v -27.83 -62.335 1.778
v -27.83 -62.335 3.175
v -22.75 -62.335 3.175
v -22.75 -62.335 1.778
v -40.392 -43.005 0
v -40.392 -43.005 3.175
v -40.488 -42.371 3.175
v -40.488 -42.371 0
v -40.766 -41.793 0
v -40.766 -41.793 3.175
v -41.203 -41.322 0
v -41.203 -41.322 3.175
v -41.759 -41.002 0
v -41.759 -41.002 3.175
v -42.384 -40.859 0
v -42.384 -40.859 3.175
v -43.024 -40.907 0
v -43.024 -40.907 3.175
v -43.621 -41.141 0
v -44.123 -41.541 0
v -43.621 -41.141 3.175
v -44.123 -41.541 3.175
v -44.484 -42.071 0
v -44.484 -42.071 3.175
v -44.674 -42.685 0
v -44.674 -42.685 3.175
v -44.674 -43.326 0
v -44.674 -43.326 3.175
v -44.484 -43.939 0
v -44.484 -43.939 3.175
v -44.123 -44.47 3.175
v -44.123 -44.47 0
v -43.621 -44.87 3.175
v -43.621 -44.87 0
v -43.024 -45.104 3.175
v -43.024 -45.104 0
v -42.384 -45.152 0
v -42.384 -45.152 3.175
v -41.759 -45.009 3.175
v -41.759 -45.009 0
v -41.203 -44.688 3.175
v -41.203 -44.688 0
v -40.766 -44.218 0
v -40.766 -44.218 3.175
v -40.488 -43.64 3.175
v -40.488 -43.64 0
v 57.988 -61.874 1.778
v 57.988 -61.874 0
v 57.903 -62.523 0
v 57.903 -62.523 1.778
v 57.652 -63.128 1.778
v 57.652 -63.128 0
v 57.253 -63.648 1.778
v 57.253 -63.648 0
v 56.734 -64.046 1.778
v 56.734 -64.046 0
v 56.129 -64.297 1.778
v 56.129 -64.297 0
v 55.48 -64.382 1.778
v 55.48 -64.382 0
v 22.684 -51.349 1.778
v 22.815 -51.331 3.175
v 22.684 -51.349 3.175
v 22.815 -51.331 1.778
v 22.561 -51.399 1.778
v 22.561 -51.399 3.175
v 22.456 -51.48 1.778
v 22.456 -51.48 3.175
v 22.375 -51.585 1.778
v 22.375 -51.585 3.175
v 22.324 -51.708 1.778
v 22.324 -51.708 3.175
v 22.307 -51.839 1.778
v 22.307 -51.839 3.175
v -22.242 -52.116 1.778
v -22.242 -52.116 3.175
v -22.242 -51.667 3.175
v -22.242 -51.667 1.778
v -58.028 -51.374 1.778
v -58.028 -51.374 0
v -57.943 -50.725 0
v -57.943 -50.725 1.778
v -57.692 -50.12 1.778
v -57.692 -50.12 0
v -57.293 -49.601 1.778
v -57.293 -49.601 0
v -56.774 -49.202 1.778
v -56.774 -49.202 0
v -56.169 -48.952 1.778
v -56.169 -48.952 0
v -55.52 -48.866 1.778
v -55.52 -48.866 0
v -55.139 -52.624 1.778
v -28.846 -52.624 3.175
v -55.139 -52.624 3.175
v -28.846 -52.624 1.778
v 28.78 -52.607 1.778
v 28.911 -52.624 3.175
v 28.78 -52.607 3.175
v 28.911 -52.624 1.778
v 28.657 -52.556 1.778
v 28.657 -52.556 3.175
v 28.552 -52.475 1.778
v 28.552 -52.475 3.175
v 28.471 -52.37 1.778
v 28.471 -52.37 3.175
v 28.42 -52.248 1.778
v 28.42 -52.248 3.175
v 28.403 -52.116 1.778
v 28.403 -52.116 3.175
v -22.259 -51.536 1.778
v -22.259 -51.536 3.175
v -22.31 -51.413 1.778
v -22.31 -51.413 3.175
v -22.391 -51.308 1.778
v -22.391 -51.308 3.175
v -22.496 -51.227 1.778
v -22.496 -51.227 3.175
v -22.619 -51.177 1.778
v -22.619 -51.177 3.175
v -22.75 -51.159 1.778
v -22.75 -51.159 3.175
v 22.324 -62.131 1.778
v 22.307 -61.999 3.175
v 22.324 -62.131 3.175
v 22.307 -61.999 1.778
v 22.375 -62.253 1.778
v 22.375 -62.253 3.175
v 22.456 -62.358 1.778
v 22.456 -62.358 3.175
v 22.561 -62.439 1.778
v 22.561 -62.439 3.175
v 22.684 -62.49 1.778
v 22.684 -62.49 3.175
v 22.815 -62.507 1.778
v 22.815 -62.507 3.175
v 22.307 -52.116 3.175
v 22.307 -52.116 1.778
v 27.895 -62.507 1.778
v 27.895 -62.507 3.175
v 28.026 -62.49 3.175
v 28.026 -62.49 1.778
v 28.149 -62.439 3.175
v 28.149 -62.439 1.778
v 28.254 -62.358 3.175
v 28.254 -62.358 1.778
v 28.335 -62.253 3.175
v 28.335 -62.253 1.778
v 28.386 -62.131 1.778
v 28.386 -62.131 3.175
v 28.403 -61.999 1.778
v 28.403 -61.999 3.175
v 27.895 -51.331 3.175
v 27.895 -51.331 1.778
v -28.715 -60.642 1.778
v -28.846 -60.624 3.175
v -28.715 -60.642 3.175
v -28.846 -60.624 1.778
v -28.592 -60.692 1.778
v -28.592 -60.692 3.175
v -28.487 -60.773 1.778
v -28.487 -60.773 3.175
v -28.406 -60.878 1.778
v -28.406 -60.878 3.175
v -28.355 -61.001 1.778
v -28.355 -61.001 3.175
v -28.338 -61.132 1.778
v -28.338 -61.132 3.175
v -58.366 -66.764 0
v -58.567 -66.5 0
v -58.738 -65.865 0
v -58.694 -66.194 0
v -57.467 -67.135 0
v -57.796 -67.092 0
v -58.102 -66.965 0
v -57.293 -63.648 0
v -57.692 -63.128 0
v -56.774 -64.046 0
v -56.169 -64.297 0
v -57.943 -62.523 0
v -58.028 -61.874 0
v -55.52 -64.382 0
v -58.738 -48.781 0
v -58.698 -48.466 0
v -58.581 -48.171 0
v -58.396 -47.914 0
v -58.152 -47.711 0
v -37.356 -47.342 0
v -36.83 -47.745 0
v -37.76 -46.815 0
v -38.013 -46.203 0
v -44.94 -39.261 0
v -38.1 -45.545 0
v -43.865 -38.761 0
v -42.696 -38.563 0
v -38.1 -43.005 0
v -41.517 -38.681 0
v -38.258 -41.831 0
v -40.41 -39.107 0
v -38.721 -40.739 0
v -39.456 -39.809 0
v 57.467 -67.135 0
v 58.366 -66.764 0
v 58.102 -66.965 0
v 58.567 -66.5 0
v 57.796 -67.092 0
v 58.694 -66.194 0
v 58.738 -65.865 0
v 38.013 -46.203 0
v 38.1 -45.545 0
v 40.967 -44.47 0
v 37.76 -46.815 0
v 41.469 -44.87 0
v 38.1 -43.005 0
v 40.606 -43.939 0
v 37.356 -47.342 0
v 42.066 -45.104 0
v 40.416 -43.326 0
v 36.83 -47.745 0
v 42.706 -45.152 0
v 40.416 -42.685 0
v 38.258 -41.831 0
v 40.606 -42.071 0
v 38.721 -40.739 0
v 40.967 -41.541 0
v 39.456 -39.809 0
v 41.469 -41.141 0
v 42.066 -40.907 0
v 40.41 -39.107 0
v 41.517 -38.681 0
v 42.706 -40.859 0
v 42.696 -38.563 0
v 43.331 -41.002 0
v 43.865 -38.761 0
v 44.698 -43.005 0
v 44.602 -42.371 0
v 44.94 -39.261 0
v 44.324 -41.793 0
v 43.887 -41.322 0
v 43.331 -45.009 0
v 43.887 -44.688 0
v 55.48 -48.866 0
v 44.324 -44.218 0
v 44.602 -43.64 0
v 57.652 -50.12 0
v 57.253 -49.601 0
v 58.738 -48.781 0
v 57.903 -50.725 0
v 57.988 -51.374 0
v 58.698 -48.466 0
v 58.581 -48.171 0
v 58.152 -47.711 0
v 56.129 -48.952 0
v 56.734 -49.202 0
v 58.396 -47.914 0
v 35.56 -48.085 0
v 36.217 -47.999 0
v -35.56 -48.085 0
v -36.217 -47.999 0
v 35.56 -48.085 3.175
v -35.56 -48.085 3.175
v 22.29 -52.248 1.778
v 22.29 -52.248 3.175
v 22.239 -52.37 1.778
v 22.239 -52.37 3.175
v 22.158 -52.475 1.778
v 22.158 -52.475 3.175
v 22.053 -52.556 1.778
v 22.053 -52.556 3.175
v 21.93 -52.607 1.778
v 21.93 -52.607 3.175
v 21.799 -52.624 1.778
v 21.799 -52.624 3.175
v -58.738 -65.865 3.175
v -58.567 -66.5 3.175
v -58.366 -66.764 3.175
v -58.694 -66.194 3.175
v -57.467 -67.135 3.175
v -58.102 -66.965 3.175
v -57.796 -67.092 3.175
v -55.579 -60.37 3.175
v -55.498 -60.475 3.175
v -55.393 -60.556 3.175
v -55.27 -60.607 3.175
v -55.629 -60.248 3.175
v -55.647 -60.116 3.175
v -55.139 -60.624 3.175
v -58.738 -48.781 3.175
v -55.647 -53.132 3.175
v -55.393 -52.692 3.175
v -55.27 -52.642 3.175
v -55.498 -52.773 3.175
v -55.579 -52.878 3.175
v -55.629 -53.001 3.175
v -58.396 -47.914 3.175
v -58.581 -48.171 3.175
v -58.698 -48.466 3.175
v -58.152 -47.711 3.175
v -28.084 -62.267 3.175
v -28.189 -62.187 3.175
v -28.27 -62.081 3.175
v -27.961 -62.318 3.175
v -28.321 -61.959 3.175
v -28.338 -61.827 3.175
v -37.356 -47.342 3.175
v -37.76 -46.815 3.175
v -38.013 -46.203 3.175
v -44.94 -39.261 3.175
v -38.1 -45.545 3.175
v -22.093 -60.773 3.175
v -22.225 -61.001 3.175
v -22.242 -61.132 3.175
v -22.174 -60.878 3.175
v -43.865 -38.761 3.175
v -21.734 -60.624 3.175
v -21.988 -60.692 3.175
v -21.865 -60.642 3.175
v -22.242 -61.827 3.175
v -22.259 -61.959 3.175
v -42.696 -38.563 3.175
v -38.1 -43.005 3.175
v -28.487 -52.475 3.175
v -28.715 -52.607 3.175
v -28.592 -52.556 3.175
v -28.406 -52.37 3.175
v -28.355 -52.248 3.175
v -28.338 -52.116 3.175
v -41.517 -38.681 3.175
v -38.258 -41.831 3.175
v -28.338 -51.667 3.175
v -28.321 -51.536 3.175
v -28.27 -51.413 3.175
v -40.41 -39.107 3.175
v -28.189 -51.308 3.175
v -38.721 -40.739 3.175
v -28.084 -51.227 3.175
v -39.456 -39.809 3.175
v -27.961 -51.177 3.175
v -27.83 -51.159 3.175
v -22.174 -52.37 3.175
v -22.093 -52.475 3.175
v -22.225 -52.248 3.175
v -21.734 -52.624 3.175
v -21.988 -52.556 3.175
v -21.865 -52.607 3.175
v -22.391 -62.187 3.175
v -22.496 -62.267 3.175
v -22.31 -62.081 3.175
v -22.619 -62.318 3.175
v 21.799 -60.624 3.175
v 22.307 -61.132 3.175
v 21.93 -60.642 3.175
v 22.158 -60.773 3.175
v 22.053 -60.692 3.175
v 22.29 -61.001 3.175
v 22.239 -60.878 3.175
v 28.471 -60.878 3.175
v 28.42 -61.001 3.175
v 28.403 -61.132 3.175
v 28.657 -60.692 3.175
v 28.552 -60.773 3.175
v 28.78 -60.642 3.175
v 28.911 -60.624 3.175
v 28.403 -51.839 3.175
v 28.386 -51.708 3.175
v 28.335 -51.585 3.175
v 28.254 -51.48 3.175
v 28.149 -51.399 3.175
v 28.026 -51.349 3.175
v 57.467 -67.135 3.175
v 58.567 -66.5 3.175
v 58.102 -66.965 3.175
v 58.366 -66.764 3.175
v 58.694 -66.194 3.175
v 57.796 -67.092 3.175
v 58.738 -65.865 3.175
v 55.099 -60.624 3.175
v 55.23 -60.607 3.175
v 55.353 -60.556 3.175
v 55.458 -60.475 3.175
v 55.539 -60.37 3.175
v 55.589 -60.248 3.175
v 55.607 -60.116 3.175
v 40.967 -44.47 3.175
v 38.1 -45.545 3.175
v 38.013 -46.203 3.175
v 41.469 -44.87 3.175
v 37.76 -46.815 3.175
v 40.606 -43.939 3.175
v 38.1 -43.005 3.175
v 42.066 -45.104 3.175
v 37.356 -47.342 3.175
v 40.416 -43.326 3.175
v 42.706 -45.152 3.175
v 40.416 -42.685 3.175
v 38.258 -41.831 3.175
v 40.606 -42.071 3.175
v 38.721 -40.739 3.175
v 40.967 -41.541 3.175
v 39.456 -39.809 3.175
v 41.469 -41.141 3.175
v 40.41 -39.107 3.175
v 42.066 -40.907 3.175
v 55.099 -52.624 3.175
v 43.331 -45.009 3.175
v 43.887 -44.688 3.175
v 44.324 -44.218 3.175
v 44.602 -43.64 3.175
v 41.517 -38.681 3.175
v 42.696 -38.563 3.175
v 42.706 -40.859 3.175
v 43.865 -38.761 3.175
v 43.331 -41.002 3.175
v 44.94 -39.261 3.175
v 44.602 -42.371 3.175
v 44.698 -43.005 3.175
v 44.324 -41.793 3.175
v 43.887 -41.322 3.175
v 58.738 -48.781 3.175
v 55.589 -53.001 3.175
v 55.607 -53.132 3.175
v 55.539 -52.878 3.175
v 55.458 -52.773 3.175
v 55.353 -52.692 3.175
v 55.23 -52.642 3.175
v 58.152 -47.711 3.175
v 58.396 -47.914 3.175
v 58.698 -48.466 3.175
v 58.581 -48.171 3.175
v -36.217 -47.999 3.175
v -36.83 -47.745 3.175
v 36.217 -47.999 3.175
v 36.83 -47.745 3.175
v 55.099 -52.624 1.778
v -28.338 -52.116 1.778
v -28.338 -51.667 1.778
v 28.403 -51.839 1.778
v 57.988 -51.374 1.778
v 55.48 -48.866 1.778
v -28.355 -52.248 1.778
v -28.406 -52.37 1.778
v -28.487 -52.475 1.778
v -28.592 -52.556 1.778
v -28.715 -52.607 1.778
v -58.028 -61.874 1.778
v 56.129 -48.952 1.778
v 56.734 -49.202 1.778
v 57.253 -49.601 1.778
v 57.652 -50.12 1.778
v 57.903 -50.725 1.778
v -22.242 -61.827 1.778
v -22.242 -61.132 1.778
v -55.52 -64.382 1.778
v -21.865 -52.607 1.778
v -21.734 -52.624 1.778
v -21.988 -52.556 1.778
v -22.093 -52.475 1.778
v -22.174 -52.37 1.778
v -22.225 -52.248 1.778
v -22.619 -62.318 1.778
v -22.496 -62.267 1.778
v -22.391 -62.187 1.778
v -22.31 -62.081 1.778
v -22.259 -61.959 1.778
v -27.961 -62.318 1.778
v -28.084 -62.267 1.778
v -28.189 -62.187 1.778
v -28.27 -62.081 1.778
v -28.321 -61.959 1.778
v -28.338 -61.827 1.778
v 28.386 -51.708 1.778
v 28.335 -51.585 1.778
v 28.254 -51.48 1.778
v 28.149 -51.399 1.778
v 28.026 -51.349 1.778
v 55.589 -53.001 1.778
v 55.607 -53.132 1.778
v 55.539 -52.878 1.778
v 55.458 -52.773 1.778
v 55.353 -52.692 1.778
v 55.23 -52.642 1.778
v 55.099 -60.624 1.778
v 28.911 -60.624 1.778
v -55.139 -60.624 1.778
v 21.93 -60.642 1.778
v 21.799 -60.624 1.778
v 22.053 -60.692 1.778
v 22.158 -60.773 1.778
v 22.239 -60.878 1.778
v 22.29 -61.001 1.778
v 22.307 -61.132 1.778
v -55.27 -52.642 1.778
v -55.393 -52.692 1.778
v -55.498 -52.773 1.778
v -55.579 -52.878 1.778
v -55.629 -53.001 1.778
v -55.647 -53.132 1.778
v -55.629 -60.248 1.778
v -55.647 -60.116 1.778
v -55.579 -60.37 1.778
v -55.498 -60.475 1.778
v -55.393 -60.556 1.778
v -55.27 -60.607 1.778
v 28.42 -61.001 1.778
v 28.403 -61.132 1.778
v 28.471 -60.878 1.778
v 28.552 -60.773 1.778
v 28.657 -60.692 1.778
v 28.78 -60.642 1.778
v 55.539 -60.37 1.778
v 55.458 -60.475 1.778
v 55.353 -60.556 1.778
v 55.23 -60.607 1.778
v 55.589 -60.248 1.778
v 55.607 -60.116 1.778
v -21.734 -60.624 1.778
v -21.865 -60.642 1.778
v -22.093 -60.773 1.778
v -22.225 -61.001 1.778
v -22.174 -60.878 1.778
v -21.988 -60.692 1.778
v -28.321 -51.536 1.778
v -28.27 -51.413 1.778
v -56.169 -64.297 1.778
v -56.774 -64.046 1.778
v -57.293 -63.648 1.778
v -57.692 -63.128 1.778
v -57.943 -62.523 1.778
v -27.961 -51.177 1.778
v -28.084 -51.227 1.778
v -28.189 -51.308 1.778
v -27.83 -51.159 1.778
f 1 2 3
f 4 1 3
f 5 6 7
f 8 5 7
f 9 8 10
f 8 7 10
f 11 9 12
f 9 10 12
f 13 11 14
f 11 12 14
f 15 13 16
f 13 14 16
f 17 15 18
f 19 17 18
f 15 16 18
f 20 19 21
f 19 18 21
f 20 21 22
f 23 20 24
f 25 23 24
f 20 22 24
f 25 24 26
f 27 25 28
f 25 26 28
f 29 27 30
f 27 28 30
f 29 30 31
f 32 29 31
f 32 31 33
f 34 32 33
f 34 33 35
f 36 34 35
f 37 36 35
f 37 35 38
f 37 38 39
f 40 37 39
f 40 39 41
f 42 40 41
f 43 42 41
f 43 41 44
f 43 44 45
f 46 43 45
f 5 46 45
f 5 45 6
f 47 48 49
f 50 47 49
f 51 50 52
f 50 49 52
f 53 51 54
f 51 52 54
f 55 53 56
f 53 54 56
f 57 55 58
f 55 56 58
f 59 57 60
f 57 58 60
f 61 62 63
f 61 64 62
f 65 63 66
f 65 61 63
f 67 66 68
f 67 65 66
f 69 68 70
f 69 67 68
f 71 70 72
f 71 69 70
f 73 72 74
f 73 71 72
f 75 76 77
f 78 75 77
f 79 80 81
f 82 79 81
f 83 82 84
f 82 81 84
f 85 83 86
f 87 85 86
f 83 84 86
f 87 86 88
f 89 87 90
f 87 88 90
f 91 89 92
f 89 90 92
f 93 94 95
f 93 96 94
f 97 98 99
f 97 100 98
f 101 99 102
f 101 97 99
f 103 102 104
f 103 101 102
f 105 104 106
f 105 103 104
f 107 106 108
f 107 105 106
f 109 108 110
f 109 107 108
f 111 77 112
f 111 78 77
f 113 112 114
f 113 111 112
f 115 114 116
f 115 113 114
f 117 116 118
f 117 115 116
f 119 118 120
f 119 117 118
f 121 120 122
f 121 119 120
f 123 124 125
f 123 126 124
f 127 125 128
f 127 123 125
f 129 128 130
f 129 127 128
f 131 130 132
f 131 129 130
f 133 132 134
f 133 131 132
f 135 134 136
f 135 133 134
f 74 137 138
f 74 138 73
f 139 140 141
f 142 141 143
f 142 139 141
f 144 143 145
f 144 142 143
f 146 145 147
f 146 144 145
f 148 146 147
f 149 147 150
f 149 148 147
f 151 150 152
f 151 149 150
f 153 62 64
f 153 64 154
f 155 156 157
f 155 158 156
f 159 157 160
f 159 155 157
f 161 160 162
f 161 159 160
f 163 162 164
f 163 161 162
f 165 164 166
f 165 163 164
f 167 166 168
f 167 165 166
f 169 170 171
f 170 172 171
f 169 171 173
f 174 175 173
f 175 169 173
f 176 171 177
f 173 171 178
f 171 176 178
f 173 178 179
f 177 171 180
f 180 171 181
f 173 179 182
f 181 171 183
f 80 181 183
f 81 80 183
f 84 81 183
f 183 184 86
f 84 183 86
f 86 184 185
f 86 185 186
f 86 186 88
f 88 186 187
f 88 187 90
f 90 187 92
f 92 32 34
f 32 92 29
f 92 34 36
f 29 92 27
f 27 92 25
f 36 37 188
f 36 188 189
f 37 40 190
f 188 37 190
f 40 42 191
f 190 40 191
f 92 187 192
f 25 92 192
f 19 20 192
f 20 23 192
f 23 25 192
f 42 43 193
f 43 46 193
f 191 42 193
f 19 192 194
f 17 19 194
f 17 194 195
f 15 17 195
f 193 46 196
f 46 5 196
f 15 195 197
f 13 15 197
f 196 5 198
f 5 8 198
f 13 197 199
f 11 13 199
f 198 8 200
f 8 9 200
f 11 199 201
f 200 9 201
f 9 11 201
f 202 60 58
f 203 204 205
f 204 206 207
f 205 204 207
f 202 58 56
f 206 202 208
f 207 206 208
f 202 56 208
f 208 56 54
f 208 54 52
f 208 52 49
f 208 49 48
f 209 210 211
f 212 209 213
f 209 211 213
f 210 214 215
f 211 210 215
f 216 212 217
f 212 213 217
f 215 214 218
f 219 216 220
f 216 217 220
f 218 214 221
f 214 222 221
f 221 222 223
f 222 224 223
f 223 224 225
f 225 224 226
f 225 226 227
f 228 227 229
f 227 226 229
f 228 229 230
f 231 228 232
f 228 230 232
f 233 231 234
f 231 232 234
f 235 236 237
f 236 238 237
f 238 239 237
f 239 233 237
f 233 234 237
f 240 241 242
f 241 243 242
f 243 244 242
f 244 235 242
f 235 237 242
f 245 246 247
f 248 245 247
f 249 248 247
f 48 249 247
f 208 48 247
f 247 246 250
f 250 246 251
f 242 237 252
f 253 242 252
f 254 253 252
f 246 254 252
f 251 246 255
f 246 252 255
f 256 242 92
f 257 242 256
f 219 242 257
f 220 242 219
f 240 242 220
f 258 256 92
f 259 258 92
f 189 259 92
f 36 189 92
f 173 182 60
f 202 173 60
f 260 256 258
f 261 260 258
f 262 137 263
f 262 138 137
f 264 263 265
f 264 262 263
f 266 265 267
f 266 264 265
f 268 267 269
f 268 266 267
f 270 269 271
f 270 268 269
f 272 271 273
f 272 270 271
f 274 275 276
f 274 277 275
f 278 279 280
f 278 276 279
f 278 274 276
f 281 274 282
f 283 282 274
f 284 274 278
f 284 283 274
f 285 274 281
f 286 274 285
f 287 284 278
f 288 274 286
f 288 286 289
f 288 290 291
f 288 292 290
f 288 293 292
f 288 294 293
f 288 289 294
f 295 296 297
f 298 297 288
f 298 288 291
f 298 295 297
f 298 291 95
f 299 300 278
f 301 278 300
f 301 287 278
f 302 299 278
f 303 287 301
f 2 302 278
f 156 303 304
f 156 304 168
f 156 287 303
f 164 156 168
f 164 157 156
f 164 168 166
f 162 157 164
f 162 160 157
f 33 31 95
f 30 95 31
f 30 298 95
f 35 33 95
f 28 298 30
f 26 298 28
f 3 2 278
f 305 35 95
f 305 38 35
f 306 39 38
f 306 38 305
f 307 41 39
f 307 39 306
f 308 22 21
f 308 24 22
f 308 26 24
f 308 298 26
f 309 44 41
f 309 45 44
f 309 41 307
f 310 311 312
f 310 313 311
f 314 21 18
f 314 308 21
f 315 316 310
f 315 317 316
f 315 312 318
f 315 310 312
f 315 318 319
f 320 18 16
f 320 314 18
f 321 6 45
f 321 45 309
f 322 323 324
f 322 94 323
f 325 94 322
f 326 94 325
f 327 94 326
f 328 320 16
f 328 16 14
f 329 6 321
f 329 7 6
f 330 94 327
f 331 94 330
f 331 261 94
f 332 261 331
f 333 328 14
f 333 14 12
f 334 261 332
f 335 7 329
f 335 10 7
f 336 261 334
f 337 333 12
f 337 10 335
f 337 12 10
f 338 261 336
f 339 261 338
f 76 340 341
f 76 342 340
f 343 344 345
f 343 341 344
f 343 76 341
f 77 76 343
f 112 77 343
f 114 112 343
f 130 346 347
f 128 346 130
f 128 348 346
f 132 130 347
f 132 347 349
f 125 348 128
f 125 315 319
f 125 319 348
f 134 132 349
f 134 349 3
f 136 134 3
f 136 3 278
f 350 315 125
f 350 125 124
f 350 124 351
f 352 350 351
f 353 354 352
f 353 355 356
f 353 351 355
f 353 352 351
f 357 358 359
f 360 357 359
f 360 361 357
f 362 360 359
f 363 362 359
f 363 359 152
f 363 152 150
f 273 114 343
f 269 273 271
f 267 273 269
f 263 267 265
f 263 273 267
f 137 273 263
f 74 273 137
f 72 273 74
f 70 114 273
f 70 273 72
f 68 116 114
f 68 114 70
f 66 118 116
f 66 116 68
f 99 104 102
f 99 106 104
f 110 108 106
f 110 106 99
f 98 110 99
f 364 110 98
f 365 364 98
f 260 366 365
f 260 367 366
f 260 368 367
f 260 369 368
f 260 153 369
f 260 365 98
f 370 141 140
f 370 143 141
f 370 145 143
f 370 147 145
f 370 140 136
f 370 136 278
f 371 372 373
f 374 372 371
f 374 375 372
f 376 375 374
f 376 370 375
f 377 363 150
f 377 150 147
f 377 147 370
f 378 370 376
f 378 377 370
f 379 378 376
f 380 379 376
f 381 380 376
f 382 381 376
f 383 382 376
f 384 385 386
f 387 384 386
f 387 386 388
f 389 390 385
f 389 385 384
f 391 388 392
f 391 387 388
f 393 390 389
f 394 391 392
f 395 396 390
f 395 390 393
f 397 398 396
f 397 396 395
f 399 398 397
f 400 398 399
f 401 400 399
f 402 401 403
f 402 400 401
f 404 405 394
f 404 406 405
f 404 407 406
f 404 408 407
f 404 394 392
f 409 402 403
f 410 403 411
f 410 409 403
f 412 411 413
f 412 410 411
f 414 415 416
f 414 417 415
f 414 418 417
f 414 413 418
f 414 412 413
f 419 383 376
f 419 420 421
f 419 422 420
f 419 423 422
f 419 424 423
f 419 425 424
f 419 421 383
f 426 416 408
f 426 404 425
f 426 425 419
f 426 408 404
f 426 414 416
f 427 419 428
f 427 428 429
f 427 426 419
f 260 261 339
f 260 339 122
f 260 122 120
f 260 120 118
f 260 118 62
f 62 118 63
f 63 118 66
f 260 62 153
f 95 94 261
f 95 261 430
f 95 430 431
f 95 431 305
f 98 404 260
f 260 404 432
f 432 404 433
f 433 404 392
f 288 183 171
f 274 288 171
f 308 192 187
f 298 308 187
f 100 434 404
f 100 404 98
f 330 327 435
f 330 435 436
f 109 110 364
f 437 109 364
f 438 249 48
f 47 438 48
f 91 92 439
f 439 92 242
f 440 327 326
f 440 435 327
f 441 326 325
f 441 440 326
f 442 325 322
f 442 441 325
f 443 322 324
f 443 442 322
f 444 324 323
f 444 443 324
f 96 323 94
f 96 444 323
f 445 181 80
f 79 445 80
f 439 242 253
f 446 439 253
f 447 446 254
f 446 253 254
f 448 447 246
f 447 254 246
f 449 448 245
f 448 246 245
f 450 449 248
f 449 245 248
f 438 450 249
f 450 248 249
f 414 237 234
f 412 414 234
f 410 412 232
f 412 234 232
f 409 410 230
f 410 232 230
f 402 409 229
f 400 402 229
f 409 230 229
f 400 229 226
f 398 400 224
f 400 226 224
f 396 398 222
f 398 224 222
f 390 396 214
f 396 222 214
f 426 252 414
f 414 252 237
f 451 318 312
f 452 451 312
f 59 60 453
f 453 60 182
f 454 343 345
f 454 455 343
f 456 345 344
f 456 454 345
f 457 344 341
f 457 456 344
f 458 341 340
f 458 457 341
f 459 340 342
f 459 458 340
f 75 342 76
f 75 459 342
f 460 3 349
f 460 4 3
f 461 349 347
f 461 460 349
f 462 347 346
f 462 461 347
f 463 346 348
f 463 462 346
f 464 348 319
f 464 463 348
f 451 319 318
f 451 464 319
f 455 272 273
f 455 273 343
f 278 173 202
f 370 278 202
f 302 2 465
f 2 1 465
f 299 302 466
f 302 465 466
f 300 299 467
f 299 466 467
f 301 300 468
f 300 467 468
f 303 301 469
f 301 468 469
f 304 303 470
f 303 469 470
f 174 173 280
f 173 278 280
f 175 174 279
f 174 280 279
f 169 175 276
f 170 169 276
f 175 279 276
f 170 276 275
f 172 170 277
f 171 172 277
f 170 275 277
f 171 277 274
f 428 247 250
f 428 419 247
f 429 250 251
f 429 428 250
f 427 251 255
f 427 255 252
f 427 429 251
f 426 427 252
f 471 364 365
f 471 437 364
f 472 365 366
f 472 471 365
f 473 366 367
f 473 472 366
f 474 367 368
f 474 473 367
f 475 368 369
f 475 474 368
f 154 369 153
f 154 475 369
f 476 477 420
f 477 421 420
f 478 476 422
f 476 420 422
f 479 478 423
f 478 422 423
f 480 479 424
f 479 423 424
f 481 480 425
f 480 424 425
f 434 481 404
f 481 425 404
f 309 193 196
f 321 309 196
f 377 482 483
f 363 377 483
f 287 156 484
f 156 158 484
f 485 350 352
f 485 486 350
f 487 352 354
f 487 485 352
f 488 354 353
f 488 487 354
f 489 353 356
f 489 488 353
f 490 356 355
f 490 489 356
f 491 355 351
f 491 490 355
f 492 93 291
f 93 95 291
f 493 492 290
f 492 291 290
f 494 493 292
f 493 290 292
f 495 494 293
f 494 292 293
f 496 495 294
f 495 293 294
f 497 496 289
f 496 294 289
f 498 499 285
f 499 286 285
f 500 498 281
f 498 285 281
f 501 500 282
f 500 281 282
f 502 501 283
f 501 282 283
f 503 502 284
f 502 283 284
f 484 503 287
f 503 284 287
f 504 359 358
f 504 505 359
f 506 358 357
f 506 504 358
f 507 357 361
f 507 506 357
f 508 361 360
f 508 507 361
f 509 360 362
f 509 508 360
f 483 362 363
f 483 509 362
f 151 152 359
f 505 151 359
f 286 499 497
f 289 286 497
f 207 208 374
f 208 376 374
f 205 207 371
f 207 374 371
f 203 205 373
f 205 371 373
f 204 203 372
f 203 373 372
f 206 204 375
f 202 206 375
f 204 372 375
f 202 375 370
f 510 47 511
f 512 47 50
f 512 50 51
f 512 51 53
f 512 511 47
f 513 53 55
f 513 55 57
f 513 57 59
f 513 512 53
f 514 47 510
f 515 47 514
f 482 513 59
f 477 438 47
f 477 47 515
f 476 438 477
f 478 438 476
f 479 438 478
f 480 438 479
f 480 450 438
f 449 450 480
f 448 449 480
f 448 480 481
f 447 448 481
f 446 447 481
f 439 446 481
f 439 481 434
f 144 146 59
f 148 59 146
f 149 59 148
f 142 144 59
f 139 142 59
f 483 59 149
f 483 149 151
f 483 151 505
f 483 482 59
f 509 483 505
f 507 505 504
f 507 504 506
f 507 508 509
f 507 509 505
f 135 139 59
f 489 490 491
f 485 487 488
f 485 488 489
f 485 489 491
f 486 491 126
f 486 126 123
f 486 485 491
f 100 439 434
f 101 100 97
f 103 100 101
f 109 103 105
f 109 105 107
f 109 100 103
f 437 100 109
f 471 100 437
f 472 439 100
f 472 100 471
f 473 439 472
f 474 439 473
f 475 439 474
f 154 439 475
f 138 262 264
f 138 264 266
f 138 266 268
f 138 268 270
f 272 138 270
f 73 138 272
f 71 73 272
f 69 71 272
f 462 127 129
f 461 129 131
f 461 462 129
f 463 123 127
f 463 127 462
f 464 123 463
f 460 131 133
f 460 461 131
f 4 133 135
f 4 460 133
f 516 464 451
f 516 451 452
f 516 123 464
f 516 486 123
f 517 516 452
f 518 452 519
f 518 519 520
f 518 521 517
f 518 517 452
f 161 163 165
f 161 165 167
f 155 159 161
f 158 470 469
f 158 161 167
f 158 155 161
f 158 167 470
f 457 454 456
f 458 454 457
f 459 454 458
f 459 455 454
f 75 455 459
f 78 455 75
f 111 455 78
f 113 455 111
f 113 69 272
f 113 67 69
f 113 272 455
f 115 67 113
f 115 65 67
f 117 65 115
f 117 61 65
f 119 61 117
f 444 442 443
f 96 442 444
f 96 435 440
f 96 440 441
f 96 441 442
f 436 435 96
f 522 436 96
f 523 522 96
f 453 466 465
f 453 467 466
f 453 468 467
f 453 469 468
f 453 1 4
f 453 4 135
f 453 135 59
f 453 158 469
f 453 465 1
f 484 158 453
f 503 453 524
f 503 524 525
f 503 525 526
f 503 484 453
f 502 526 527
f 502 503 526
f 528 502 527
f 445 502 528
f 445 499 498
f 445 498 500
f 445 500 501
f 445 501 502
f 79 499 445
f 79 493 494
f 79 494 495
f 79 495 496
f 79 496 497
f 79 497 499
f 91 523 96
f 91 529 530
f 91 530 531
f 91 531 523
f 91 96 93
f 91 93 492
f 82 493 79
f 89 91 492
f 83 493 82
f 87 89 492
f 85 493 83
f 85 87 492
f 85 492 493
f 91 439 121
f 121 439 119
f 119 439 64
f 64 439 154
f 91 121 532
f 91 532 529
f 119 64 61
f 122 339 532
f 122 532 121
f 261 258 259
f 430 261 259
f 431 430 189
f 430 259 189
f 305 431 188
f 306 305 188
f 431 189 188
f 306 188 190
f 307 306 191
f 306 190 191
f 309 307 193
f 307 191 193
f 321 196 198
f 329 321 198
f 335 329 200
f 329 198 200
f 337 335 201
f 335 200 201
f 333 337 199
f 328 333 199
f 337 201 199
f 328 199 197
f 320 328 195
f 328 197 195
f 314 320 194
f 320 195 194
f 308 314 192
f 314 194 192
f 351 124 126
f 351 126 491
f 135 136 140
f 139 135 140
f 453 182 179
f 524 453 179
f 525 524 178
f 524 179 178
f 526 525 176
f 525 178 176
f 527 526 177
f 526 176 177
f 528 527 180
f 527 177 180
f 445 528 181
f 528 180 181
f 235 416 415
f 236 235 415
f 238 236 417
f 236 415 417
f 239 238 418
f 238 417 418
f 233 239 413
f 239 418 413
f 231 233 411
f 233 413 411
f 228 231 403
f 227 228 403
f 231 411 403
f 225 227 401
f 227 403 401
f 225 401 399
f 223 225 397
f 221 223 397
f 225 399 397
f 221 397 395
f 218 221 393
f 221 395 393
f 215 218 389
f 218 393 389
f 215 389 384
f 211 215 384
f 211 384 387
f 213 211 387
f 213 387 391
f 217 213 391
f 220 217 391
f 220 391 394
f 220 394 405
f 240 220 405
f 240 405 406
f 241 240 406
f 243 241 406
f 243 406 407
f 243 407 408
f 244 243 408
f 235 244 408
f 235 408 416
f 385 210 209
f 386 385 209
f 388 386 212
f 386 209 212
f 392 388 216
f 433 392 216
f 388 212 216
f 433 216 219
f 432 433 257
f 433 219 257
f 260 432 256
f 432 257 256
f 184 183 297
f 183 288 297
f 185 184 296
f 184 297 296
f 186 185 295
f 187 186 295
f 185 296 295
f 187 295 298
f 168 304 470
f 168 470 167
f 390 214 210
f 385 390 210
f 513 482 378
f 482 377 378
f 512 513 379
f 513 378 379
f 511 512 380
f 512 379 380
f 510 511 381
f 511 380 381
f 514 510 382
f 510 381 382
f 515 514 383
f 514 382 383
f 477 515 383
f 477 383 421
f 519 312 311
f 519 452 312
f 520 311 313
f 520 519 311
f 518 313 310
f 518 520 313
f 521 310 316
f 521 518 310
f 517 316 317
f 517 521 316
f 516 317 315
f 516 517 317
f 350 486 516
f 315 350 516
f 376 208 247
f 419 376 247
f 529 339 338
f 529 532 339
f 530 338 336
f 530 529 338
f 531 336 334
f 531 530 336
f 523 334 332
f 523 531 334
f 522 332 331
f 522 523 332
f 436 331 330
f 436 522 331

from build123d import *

# Parameters (mm, degrees)
BOSS_EXTRUDE1_DEPTH   = 3.175
F_6_CLEARANCE_HOLE1_D = 4.3053
FILLET3_R             = 1.27
CUT_EXTRUDE3_DEPTH    = 1.778
SKETCH9_W             = 6.096
SKETCH9_H             = 11.176
CUT_EXTRUDE4_DEPTH    = 4.175
SKETCH10_W            = 111.2535
SKETCH10_H            = 8
CUT_EXTRUDE5_DEPTH    = 2.397
FILLET5_R             = 0.508


with BuildPart() as part:
    # Sketch1 → Boss-Extrude1 (new body)
    with BuildSketch(Plane.XY):
        with BuildLine():
            Line((58.7375, -67.1354797), (58.7375, -48.0854797))
            Line((58.7375, -48.0854797), (44.939976119, -39.26086832))
            ThreePointArc((44.939976119, -39.26086832), (40.410479427, -39.106525106), (38.1, -43.0054797))
            Line((38.1, -43.0054797), (38.1, -45.5454797))
            ThreePointArc((38.1, -45.5454797), (37.356051224, -47.341530924), (35.56, -48.0854797))
            Line((35.56, -48.0854797), (-35.56, -48.0854797))
            ThreePointArc((-35.56, -48.0854797), (-37.356051224, -47.341530924), (-38.1, -45.5454797))
            Line((-38.1, -45.5454797), (-38.1, -43.0054797))
            ThreePointArc((-38.1, -43.0054797), (-40.410479427, -39.106525106), (-44.939976119, -39.26086832))
            Line((-44.939976119, -39.26086832), (-58.7375, -48.0854797))
            Line((-58.7375, -48.0854797), (-58.7375, -67.1354797))
            Line((-58.7375, -67.1354797), (58.7375, -67.1354797))
        make_face()
    extrude(amount=BOSS_EXTRUDE1_DEPTH)

    # #6 Clearance Hole1 (through all)
    with Locations(Plane(origin=(0, 0, 0), x_dir=(-1, 0, 0), z_dir=(0, 0, -1))):
        with Locations((42.545, -43.0054797), (-42.545, -43.0054797)):
            Hole(F_6_CLEARANCE_HOLE1_D / 2)

    # Fillet3
    fillet3_edges = [part.edges().sort_by_distance(p)[0] for p in [
        (-58.7375, -67.1354797, 1.5875),
        (-58.7375, -48.0854797, 1.5875),
        (58.7375, -48.0854797, 1.5875),
        (58.7375, -67.1354797, 1.5875),
    ]]
    fillet(fillet3_edges, radius=FILLET3_R)

    # Sketch8 → Cut-Extrude3 (cut)
    with BuildSketch(Plane(origin=(0, 0, 0), x_dir=(-1, 0, 0), z_dir=(0, 0, -1))):
        with BuildLine():
            Line((58.028, -61.8742797), (58.028, -51.3742797))
            ThreePointArc((58.028, -51.3742797), (57.293423807, -49.600855893), (55.52, -48.8662797))
            Line((55.52, -48.8662797), (-55.48, -48.8662797))
            ThreePointArc((-55.48, -48.8662797), (-57.253423807, -49.600855893), (-57.988, -51.3742797))
            Line((-57.988, -51.3742797), (-57.988, -61.8742797))
            ThreePointArc((-57.988, -61.8742797), (-57.253423807, -63.647703507), (-55.48, -64.3822797))
            Line((-55.48, -64.3822797), (55.52, -64.3822797))
            ThreePointArc((55.52, -64.3822797), (57.293423807, -63.647703507), (58.028, -61.8742797))
        make_face()
    extrude(amount=-CUT_EXTRUDE3_DEPTH, mode=Mode.SUBTRACT)

    # Sketch9 → Cut-Extrude4 (cut, through all)
    with BuildSketch(Plane.XY.offset(3.175)):
        with Locations((-25.29, -56.7473797)):
            Rectangle(SKETCH9_W, SKETCH9_H)
        with Locations((25.355, -56.9192547)):
            Rectangle(SKETCH9_W, SKETCH9_H)
    extrude(amount=-CUT_EXTRUDE4_DEPTH, mode=Mode.SUBTRACT)

    # Sketch10 → Cut-Extrude5 (cut, through all)
    with BuildSketch(Plane(origin=(0, 0, 1.778), x_dir=(-1, 0, 0), z_dir=(0, 0, -1))):
        with Locations((0.02, -56.6242797)):
            Rectangle(SKETCH10_W, SKETCH10_H)
    extrude(amount=-CUT_EXTRUDE5_DEPTH, mode=Mode.SUBTRACT)

    # Fillet5
    fillet5_edges = [part.edges().sort_by_distance(p)[0] for p in [
        (-22.242, -51.1593797, 2.4765),
        (-22.242, -62.3353797, 2.4765),
        (-28.338, -62.3353797, 2.4765),
        (-28.338, -51.1593797, 2.4765),
        (28.403, -51.3312547, 2.4765),
        (28.403, -62.5072547, 2.4765),
        (22.307, -62.5072547, 2.4765),
        (22.307, -51.3312547, 2.4765),
        (-28.338, -60.6242797, 2.4765),
        (-28.338, -52.6242797, 2.4765),
        (28.403, -52.6242797, 2.4765),
        (55.60675, -52.6242797, 2.4765),
        (22.307, -52.6242797, 2.4765),
        (-22.242, -52.6242797, 2.4765),
        (28.403, -60.6242797, 2.4765),
        (22.307, -60.6242797, 2.4765),
        (-22.242, -60.6242797, 2.4765),
        (-55.64675, -60.6242797, 2.4765),
        (55.60675, -60.6242797, 2.4765),
        (-55.64675, -52.6242797, 2.4765),
    ]]
    fillet(fillet5_edges, radius=FILLET5_R)


solid = part.part
